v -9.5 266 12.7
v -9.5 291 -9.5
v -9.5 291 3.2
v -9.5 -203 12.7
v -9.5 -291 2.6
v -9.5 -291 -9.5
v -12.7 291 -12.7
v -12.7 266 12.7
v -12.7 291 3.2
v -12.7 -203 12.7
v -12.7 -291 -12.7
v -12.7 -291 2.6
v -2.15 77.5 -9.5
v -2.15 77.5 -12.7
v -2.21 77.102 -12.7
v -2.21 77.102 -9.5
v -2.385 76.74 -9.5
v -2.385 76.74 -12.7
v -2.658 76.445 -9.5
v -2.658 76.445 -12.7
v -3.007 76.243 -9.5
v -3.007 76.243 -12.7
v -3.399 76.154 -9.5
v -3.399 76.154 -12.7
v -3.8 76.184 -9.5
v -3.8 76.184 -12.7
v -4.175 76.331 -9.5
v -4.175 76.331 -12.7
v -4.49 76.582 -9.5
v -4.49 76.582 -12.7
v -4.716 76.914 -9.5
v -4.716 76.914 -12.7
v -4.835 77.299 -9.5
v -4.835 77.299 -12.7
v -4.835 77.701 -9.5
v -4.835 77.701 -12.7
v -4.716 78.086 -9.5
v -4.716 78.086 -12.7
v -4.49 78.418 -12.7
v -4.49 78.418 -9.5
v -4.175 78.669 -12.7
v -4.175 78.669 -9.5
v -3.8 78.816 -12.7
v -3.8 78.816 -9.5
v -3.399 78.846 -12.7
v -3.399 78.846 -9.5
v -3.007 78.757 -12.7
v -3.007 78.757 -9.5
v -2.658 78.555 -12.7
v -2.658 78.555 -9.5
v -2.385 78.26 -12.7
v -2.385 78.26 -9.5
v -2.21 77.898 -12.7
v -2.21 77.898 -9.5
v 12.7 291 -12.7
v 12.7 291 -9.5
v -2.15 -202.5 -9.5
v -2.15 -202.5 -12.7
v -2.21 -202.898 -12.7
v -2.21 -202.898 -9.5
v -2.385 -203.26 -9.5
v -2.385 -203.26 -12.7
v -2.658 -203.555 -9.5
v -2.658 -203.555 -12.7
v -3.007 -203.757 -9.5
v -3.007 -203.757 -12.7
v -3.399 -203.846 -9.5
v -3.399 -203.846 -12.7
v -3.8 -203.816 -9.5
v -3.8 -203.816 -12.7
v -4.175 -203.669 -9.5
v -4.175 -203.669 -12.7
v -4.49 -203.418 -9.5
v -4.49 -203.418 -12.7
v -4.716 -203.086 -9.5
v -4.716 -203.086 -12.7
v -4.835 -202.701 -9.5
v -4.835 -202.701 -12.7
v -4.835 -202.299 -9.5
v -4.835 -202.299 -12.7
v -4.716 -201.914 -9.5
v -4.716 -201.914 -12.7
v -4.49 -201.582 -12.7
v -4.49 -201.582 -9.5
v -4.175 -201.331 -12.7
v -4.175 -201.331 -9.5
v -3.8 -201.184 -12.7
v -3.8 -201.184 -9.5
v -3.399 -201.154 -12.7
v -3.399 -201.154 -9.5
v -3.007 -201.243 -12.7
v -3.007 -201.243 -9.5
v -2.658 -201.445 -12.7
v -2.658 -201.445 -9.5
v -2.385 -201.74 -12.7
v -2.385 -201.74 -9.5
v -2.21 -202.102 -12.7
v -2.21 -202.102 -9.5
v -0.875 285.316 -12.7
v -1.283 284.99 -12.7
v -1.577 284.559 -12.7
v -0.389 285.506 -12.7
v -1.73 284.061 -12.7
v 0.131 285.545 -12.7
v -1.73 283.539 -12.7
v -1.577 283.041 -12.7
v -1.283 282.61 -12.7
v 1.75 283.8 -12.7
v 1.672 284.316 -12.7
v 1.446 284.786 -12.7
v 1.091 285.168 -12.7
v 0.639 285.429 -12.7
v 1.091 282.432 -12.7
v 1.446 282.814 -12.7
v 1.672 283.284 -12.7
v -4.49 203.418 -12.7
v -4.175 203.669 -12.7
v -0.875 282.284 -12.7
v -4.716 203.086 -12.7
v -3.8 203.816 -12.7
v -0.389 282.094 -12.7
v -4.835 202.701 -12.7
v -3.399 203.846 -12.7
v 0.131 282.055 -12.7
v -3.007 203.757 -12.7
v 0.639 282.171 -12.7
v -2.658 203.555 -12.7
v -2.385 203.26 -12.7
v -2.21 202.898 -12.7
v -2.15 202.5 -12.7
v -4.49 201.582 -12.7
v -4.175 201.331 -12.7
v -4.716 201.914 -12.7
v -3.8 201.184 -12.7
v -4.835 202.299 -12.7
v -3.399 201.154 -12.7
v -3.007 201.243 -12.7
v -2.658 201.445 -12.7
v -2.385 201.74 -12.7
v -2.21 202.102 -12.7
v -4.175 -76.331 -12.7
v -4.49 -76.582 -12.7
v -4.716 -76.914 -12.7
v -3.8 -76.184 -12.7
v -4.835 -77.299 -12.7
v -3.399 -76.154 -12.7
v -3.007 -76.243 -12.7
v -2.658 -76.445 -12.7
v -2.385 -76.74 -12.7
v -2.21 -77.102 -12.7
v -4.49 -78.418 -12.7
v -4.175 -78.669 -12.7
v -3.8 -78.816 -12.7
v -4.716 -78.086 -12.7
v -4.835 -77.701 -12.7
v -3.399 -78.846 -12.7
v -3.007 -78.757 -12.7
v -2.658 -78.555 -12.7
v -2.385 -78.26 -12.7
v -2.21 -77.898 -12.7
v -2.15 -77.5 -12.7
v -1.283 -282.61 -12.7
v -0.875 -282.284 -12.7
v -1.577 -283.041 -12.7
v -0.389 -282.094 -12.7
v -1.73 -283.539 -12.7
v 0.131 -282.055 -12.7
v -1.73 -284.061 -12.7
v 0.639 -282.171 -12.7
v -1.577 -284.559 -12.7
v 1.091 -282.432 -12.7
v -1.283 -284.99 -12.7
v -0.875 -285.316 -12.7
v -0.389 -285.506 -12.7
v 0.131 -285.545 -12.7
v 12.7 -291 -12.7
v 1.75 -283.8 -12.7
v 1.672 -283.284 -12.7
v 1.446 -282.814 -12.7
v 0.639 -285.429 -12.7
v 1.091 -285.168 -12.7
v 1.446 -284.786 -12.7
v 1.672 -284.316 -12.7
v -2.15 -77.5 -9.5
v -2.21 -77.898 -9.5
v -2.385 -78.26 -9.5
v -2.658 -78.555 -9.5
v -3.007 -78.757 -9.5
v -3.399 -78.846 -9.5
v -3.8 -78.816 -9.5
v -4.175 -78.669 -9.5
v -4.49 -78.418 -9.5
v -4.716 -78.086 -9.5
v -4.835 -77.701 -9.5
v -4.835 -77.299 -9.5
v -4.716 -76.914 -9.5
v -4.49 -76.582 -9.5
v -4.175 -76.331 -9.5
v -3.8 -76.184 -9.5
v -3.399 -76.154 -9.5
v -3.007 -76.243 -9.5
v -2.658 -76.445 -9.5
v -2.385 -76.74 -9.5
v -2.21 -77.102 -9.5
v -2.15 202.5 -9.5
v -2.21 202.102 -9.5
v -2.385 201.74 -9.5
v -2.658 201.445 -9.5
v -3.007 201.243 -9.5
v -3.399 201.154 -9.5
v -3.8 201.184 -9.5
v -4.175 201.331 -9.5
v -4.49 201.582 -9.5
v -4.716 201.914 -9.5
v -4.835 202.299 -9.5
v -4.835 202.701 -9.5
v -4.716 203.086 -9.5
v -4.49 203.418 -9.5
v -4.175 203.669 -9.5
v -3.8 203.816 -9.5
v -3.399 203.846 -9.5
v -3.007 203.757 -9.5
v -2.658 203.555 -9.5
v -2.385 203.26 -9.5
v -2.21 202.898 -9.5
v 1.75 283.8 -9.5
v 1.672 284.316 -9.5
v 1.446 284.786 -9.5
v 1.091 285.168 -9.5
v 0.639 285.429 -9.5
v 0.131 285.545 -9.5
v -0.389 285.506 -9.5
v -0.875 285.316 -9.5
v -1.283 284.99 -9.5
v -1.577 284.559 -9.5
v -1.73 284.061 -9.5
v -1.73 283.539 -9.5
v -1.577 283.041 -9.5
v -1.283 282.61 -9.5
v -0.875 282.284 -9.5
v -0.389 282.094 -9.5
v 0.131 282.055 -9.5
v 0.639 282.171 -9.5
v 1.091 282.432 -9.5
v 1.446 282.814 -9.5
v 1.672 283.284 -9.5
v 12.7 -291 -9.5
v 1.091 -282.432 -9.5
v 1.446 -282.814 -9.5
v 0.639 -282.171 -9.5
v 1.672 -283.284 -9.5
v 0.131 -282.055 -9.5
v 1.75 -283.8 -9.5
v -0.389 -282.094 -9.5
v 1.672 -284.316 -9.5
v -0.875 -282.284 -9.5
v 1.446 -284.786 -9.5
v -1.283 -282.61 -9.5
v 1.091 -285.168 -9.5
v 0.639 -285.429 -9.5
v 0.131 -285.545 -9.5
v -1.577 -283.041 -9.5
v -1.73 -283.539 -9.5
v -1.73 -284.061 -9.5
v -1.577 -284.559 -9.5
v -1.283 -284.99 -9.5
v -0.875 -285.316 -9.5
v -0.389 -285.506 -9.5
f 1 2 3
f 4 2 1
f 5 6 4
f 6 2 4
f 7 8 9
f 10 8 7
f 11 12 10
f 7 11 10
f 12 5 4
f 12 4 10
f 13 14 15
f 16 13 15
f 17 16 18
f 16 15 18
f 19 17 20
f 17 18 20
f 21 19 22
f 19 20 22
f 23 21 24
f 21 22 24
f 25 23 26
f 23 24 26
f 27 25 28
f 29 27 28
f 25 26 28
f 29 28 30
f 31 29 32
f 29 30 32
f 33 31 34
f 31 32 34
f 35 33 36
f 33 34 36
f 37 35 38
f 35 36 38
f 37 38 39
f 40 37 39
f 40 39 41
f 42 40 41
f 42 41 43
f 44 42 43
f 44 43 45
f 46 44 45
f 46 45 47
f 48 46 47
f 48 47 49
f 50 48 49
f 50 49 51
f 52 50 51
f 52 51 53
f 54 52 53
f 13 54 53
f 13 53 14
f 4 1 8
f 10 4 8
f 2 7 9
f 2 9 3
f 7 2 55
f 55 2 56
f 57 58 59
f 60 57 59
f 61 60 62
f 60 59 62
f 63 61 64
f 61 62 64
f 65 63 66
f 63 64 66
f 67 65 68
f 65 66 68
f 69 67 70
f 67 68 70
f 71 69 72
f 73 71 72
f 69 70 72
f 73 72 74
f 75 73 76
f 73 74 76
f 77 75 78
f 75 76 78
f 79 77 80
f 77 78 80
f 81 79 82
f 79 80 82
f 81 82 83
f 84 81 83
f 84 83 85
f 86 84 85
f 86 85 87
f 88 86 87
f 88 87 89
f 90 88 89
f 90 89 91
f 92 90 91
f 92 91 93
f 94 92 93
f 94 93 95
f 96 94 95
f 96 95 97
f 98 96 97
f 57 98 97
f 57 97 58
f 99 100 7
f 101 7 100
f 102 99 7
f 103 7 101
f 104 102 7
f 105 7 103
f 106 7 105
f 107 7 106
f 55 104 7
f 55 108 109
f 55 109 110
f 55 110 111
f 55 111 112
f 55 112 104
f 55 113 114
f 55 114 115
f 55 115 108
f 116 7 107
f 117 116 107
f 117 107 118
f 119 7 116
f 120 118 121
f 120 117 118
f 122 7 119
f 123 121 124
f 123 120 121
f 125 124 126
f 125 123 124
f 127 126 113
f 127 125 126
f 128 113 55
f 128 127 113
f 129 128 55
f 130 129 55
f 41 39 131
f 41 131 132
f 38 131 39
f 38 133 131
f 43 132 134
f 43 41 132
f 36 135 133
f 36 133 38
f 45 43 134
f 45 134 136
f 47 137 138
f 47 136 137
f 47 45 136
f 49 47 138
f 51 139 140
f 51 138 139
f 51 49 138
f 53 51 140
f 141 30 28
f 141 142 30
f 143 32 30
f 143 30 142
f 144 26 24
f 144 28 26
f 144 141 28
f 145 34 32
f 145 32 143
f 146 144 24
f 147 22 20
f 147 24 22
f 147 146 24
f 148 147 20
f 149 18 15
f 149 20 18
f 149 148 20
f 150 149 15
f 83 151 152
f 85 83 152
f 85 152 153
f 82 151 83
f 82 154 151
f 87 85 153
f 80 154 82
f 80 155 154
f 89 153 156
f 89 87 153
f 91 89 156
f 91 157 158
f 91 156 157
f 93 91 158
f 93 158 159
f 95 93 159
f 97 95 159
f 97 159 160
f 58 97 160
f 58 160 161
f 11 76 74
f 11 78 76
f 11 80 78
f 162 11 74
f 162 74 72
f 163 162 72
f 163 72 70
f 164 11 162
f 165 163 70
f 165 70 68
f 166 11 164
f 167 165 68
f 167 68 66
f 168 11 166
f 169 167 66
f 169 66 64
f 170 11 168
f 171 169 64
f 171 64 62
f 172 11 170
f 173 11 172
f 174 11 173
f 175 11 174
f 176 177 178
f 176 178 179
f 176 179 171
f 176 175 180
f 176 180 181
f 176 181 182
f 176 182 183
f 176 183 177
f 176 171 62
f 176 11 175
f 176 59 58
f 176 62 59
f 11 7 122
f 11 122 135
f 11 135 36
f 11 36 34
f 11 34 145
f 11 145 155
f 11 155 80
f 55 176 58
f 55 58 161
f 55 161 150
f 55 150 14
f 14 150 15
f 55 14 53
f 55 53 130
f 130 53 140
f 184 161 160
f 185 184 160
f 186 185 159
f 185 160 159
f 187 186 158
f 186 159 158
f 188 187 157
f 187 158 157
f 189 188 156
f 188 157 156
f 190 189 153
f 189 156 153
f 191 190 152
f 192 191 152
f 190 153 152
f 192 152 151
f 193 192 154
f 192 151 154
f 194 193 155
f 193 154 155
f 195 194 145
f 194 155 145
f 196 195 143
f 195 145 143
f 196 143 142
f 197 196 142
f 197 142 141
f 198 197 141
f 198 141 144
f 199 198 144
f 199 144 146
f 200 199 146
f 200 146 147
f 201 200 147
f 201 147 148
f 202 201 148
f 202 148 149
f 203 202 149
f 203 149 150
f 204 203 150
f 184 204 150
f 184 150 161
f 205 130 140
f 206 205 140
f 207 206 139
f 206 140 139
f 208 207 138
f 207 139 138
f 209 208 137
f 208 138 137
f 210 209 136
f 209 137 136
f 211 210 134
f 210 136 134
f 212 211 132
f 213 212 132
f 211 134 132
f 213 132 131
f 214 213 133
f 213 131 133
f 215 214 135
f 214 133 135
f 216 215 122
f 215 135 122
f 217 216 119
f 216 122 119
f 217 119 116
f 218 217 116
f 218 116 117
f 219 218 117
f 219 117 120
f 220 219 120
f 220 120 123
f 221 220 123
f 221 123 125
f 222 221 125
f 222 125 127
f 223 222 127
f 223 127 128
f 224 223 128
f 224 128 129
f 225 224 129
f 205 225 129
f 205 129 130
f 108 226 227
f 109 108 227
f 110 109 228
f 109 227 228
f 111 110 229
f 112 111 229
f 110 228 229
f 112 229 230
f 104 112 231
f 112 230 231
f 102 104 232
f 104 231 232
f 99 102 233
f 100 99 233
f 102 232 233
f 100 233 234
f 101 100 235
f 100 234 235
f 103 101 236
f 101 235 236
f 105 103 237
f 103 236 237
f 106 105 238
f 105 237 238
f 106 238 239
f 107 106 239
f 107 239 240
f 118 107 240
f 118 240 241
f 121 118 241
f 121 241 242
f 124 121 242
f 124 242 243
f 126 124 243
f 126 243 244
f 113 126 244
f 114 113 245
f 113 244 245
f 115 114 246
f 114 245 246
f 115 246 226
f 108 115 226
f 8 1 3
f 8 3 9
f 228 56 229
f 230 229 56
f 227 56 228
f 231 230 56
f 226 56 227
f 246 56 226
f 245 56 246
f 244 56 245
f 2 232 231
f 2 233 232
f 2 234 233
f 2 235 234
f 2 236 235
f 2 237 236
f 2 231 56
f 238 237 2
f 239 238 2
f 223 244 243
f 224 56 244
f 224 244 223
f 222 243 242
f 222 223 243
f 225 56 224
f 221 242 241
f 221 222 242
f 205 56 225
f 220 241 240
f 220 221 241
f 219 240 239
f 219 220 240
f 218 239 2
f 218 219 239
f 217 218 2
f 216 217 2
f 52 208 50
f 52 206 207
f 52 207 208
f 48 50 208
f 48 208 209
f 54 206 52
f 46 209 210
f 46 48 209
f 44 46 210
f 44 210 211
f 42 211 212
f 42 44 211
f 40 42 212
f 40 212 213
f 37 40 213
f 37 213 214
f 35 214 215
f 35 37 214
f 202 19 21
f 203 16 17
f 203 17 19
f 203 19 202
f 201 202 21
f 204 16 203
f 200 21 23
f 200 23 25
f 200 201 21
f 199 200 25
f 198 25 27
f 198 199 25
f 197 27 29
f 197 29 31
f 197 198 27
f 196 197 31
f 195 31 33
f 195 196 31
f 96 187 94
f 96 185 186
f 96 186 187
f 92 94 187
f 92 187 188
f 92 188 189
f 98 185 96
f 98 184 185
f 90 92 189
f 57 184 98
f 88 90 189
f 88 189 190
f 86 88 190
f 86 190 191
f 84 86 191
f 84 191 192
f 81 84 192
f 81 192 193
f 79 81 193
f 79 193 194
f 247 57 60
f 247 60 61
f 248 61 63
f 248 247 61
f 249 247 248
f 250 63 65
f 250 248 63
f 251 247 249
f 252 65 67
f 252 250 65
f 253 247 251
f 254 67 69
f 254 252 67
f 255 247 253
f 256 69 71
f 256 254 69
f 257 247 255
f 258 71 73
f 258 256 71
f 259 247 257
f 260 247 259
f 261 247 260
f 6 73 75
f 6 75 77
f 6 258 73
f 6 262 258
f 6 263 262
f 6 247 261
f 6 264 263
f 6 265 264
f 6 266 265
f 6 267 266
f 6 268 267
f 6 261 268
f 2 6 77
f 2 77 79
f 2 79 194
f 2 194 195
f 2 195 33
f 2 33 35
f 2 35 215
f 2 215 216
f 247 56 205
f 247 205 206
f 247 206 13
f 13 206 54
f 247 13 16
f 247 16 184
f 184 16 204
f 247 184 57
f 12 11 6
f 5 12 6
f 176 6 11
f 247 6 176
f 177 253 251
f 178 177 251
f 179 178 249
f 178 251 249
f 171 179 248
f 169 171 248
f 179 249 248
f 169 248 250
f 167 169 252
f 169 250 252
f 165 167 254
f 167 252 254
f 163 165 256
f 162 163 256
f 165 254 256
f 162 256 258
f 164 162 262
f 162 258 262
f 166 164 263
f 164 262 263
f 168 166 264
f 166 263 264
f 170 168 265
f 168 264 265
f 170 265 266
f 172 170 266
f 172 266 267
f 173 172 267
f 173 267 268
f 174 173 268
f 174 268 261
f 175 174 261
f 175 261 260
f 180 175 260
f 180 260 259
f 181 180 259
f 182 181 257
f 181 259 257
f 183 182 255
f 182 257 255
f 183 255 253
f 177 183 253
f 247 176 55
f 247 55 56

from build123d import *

# Parameters (mm, degrees)
F1_DEPTH = 291
F3_SIZE2 = 10.1
F3_SIZE  = 88
F4_SIZE2 = 25
F4_SIZE  = 9.5
F5_R     = 1.75
F6_DEPTH = 3.2
F2_R     = 1.35
F7_DEPTH = 25.401


with BuildPart() as f1:
    # F0 (on Front) → F1 (new body, symmetric)
    with BuildSketch(Plane.XZ):
        Polygon((-9.5, 12.7), (-12.7, 12.7), (-12.7, -12.7), (12.7, -12.7), (12.7, -9.5), (-9.5, -9.5), align=None)
    extrude(amount=F1_DEPTH, both=True)

    # F3
    f3_edges = [f1.edges().sort_by_distance(p)[0] for p in [
        (-11.1, -291, 12.7),
    ]]
    f3_side = f1.faces().sort_by_distance((-11.1, 0, 12.7))[0]
    chamfer(f3_edges, length=F3_SIZE, length2=F3_SIZE2, reference=f3_side)

    # F4
    f4_edges = [f1.edges().sort_by_distance(p)[0] for p in [
        (-11.1, 291, 12.7),
    ]]
    f4_side = f1.faces().sort_by_distance((-11.1, 291, 12.34079))[0]
    chamfer(f4_edges, length=F4_SIZE, length2=F4_SIZE2, reference=f4_side)

    # F5 (on face) → F6 (cut, through all)
    with BuildSketch(Plane.XY.offset(-9.5)):
        with Locations((0, -283.8)):
            Circle(F5_R)
        with Locations((0, 283.8)):
            Circle(F5_R)
    extrude(amount=-F6_DEPTH, mode=Mode.SUBTRACT)

    # F2 (on face) → F7 (cut, through all)
    with BuildSketch(Plane(origin=(0, 0, -12.7), x_dir=(1, 0, 0), z_dir=(0, 0, -1))):
        with Locations((-3.5, 77.5)):
            Circle(F2_R)
        with Locations((-3.5, -77.5)):
            Circle(F2_R)
        with Locations((-3.5, -202.5)):
            Circle(F2_R)
        with Locations((-3.5, 202.5)):
            Circle(F2_R)
    extrude(amount=-F7_DEPTH, mode=Mode.SUBTRACT)


solid = f1.part
